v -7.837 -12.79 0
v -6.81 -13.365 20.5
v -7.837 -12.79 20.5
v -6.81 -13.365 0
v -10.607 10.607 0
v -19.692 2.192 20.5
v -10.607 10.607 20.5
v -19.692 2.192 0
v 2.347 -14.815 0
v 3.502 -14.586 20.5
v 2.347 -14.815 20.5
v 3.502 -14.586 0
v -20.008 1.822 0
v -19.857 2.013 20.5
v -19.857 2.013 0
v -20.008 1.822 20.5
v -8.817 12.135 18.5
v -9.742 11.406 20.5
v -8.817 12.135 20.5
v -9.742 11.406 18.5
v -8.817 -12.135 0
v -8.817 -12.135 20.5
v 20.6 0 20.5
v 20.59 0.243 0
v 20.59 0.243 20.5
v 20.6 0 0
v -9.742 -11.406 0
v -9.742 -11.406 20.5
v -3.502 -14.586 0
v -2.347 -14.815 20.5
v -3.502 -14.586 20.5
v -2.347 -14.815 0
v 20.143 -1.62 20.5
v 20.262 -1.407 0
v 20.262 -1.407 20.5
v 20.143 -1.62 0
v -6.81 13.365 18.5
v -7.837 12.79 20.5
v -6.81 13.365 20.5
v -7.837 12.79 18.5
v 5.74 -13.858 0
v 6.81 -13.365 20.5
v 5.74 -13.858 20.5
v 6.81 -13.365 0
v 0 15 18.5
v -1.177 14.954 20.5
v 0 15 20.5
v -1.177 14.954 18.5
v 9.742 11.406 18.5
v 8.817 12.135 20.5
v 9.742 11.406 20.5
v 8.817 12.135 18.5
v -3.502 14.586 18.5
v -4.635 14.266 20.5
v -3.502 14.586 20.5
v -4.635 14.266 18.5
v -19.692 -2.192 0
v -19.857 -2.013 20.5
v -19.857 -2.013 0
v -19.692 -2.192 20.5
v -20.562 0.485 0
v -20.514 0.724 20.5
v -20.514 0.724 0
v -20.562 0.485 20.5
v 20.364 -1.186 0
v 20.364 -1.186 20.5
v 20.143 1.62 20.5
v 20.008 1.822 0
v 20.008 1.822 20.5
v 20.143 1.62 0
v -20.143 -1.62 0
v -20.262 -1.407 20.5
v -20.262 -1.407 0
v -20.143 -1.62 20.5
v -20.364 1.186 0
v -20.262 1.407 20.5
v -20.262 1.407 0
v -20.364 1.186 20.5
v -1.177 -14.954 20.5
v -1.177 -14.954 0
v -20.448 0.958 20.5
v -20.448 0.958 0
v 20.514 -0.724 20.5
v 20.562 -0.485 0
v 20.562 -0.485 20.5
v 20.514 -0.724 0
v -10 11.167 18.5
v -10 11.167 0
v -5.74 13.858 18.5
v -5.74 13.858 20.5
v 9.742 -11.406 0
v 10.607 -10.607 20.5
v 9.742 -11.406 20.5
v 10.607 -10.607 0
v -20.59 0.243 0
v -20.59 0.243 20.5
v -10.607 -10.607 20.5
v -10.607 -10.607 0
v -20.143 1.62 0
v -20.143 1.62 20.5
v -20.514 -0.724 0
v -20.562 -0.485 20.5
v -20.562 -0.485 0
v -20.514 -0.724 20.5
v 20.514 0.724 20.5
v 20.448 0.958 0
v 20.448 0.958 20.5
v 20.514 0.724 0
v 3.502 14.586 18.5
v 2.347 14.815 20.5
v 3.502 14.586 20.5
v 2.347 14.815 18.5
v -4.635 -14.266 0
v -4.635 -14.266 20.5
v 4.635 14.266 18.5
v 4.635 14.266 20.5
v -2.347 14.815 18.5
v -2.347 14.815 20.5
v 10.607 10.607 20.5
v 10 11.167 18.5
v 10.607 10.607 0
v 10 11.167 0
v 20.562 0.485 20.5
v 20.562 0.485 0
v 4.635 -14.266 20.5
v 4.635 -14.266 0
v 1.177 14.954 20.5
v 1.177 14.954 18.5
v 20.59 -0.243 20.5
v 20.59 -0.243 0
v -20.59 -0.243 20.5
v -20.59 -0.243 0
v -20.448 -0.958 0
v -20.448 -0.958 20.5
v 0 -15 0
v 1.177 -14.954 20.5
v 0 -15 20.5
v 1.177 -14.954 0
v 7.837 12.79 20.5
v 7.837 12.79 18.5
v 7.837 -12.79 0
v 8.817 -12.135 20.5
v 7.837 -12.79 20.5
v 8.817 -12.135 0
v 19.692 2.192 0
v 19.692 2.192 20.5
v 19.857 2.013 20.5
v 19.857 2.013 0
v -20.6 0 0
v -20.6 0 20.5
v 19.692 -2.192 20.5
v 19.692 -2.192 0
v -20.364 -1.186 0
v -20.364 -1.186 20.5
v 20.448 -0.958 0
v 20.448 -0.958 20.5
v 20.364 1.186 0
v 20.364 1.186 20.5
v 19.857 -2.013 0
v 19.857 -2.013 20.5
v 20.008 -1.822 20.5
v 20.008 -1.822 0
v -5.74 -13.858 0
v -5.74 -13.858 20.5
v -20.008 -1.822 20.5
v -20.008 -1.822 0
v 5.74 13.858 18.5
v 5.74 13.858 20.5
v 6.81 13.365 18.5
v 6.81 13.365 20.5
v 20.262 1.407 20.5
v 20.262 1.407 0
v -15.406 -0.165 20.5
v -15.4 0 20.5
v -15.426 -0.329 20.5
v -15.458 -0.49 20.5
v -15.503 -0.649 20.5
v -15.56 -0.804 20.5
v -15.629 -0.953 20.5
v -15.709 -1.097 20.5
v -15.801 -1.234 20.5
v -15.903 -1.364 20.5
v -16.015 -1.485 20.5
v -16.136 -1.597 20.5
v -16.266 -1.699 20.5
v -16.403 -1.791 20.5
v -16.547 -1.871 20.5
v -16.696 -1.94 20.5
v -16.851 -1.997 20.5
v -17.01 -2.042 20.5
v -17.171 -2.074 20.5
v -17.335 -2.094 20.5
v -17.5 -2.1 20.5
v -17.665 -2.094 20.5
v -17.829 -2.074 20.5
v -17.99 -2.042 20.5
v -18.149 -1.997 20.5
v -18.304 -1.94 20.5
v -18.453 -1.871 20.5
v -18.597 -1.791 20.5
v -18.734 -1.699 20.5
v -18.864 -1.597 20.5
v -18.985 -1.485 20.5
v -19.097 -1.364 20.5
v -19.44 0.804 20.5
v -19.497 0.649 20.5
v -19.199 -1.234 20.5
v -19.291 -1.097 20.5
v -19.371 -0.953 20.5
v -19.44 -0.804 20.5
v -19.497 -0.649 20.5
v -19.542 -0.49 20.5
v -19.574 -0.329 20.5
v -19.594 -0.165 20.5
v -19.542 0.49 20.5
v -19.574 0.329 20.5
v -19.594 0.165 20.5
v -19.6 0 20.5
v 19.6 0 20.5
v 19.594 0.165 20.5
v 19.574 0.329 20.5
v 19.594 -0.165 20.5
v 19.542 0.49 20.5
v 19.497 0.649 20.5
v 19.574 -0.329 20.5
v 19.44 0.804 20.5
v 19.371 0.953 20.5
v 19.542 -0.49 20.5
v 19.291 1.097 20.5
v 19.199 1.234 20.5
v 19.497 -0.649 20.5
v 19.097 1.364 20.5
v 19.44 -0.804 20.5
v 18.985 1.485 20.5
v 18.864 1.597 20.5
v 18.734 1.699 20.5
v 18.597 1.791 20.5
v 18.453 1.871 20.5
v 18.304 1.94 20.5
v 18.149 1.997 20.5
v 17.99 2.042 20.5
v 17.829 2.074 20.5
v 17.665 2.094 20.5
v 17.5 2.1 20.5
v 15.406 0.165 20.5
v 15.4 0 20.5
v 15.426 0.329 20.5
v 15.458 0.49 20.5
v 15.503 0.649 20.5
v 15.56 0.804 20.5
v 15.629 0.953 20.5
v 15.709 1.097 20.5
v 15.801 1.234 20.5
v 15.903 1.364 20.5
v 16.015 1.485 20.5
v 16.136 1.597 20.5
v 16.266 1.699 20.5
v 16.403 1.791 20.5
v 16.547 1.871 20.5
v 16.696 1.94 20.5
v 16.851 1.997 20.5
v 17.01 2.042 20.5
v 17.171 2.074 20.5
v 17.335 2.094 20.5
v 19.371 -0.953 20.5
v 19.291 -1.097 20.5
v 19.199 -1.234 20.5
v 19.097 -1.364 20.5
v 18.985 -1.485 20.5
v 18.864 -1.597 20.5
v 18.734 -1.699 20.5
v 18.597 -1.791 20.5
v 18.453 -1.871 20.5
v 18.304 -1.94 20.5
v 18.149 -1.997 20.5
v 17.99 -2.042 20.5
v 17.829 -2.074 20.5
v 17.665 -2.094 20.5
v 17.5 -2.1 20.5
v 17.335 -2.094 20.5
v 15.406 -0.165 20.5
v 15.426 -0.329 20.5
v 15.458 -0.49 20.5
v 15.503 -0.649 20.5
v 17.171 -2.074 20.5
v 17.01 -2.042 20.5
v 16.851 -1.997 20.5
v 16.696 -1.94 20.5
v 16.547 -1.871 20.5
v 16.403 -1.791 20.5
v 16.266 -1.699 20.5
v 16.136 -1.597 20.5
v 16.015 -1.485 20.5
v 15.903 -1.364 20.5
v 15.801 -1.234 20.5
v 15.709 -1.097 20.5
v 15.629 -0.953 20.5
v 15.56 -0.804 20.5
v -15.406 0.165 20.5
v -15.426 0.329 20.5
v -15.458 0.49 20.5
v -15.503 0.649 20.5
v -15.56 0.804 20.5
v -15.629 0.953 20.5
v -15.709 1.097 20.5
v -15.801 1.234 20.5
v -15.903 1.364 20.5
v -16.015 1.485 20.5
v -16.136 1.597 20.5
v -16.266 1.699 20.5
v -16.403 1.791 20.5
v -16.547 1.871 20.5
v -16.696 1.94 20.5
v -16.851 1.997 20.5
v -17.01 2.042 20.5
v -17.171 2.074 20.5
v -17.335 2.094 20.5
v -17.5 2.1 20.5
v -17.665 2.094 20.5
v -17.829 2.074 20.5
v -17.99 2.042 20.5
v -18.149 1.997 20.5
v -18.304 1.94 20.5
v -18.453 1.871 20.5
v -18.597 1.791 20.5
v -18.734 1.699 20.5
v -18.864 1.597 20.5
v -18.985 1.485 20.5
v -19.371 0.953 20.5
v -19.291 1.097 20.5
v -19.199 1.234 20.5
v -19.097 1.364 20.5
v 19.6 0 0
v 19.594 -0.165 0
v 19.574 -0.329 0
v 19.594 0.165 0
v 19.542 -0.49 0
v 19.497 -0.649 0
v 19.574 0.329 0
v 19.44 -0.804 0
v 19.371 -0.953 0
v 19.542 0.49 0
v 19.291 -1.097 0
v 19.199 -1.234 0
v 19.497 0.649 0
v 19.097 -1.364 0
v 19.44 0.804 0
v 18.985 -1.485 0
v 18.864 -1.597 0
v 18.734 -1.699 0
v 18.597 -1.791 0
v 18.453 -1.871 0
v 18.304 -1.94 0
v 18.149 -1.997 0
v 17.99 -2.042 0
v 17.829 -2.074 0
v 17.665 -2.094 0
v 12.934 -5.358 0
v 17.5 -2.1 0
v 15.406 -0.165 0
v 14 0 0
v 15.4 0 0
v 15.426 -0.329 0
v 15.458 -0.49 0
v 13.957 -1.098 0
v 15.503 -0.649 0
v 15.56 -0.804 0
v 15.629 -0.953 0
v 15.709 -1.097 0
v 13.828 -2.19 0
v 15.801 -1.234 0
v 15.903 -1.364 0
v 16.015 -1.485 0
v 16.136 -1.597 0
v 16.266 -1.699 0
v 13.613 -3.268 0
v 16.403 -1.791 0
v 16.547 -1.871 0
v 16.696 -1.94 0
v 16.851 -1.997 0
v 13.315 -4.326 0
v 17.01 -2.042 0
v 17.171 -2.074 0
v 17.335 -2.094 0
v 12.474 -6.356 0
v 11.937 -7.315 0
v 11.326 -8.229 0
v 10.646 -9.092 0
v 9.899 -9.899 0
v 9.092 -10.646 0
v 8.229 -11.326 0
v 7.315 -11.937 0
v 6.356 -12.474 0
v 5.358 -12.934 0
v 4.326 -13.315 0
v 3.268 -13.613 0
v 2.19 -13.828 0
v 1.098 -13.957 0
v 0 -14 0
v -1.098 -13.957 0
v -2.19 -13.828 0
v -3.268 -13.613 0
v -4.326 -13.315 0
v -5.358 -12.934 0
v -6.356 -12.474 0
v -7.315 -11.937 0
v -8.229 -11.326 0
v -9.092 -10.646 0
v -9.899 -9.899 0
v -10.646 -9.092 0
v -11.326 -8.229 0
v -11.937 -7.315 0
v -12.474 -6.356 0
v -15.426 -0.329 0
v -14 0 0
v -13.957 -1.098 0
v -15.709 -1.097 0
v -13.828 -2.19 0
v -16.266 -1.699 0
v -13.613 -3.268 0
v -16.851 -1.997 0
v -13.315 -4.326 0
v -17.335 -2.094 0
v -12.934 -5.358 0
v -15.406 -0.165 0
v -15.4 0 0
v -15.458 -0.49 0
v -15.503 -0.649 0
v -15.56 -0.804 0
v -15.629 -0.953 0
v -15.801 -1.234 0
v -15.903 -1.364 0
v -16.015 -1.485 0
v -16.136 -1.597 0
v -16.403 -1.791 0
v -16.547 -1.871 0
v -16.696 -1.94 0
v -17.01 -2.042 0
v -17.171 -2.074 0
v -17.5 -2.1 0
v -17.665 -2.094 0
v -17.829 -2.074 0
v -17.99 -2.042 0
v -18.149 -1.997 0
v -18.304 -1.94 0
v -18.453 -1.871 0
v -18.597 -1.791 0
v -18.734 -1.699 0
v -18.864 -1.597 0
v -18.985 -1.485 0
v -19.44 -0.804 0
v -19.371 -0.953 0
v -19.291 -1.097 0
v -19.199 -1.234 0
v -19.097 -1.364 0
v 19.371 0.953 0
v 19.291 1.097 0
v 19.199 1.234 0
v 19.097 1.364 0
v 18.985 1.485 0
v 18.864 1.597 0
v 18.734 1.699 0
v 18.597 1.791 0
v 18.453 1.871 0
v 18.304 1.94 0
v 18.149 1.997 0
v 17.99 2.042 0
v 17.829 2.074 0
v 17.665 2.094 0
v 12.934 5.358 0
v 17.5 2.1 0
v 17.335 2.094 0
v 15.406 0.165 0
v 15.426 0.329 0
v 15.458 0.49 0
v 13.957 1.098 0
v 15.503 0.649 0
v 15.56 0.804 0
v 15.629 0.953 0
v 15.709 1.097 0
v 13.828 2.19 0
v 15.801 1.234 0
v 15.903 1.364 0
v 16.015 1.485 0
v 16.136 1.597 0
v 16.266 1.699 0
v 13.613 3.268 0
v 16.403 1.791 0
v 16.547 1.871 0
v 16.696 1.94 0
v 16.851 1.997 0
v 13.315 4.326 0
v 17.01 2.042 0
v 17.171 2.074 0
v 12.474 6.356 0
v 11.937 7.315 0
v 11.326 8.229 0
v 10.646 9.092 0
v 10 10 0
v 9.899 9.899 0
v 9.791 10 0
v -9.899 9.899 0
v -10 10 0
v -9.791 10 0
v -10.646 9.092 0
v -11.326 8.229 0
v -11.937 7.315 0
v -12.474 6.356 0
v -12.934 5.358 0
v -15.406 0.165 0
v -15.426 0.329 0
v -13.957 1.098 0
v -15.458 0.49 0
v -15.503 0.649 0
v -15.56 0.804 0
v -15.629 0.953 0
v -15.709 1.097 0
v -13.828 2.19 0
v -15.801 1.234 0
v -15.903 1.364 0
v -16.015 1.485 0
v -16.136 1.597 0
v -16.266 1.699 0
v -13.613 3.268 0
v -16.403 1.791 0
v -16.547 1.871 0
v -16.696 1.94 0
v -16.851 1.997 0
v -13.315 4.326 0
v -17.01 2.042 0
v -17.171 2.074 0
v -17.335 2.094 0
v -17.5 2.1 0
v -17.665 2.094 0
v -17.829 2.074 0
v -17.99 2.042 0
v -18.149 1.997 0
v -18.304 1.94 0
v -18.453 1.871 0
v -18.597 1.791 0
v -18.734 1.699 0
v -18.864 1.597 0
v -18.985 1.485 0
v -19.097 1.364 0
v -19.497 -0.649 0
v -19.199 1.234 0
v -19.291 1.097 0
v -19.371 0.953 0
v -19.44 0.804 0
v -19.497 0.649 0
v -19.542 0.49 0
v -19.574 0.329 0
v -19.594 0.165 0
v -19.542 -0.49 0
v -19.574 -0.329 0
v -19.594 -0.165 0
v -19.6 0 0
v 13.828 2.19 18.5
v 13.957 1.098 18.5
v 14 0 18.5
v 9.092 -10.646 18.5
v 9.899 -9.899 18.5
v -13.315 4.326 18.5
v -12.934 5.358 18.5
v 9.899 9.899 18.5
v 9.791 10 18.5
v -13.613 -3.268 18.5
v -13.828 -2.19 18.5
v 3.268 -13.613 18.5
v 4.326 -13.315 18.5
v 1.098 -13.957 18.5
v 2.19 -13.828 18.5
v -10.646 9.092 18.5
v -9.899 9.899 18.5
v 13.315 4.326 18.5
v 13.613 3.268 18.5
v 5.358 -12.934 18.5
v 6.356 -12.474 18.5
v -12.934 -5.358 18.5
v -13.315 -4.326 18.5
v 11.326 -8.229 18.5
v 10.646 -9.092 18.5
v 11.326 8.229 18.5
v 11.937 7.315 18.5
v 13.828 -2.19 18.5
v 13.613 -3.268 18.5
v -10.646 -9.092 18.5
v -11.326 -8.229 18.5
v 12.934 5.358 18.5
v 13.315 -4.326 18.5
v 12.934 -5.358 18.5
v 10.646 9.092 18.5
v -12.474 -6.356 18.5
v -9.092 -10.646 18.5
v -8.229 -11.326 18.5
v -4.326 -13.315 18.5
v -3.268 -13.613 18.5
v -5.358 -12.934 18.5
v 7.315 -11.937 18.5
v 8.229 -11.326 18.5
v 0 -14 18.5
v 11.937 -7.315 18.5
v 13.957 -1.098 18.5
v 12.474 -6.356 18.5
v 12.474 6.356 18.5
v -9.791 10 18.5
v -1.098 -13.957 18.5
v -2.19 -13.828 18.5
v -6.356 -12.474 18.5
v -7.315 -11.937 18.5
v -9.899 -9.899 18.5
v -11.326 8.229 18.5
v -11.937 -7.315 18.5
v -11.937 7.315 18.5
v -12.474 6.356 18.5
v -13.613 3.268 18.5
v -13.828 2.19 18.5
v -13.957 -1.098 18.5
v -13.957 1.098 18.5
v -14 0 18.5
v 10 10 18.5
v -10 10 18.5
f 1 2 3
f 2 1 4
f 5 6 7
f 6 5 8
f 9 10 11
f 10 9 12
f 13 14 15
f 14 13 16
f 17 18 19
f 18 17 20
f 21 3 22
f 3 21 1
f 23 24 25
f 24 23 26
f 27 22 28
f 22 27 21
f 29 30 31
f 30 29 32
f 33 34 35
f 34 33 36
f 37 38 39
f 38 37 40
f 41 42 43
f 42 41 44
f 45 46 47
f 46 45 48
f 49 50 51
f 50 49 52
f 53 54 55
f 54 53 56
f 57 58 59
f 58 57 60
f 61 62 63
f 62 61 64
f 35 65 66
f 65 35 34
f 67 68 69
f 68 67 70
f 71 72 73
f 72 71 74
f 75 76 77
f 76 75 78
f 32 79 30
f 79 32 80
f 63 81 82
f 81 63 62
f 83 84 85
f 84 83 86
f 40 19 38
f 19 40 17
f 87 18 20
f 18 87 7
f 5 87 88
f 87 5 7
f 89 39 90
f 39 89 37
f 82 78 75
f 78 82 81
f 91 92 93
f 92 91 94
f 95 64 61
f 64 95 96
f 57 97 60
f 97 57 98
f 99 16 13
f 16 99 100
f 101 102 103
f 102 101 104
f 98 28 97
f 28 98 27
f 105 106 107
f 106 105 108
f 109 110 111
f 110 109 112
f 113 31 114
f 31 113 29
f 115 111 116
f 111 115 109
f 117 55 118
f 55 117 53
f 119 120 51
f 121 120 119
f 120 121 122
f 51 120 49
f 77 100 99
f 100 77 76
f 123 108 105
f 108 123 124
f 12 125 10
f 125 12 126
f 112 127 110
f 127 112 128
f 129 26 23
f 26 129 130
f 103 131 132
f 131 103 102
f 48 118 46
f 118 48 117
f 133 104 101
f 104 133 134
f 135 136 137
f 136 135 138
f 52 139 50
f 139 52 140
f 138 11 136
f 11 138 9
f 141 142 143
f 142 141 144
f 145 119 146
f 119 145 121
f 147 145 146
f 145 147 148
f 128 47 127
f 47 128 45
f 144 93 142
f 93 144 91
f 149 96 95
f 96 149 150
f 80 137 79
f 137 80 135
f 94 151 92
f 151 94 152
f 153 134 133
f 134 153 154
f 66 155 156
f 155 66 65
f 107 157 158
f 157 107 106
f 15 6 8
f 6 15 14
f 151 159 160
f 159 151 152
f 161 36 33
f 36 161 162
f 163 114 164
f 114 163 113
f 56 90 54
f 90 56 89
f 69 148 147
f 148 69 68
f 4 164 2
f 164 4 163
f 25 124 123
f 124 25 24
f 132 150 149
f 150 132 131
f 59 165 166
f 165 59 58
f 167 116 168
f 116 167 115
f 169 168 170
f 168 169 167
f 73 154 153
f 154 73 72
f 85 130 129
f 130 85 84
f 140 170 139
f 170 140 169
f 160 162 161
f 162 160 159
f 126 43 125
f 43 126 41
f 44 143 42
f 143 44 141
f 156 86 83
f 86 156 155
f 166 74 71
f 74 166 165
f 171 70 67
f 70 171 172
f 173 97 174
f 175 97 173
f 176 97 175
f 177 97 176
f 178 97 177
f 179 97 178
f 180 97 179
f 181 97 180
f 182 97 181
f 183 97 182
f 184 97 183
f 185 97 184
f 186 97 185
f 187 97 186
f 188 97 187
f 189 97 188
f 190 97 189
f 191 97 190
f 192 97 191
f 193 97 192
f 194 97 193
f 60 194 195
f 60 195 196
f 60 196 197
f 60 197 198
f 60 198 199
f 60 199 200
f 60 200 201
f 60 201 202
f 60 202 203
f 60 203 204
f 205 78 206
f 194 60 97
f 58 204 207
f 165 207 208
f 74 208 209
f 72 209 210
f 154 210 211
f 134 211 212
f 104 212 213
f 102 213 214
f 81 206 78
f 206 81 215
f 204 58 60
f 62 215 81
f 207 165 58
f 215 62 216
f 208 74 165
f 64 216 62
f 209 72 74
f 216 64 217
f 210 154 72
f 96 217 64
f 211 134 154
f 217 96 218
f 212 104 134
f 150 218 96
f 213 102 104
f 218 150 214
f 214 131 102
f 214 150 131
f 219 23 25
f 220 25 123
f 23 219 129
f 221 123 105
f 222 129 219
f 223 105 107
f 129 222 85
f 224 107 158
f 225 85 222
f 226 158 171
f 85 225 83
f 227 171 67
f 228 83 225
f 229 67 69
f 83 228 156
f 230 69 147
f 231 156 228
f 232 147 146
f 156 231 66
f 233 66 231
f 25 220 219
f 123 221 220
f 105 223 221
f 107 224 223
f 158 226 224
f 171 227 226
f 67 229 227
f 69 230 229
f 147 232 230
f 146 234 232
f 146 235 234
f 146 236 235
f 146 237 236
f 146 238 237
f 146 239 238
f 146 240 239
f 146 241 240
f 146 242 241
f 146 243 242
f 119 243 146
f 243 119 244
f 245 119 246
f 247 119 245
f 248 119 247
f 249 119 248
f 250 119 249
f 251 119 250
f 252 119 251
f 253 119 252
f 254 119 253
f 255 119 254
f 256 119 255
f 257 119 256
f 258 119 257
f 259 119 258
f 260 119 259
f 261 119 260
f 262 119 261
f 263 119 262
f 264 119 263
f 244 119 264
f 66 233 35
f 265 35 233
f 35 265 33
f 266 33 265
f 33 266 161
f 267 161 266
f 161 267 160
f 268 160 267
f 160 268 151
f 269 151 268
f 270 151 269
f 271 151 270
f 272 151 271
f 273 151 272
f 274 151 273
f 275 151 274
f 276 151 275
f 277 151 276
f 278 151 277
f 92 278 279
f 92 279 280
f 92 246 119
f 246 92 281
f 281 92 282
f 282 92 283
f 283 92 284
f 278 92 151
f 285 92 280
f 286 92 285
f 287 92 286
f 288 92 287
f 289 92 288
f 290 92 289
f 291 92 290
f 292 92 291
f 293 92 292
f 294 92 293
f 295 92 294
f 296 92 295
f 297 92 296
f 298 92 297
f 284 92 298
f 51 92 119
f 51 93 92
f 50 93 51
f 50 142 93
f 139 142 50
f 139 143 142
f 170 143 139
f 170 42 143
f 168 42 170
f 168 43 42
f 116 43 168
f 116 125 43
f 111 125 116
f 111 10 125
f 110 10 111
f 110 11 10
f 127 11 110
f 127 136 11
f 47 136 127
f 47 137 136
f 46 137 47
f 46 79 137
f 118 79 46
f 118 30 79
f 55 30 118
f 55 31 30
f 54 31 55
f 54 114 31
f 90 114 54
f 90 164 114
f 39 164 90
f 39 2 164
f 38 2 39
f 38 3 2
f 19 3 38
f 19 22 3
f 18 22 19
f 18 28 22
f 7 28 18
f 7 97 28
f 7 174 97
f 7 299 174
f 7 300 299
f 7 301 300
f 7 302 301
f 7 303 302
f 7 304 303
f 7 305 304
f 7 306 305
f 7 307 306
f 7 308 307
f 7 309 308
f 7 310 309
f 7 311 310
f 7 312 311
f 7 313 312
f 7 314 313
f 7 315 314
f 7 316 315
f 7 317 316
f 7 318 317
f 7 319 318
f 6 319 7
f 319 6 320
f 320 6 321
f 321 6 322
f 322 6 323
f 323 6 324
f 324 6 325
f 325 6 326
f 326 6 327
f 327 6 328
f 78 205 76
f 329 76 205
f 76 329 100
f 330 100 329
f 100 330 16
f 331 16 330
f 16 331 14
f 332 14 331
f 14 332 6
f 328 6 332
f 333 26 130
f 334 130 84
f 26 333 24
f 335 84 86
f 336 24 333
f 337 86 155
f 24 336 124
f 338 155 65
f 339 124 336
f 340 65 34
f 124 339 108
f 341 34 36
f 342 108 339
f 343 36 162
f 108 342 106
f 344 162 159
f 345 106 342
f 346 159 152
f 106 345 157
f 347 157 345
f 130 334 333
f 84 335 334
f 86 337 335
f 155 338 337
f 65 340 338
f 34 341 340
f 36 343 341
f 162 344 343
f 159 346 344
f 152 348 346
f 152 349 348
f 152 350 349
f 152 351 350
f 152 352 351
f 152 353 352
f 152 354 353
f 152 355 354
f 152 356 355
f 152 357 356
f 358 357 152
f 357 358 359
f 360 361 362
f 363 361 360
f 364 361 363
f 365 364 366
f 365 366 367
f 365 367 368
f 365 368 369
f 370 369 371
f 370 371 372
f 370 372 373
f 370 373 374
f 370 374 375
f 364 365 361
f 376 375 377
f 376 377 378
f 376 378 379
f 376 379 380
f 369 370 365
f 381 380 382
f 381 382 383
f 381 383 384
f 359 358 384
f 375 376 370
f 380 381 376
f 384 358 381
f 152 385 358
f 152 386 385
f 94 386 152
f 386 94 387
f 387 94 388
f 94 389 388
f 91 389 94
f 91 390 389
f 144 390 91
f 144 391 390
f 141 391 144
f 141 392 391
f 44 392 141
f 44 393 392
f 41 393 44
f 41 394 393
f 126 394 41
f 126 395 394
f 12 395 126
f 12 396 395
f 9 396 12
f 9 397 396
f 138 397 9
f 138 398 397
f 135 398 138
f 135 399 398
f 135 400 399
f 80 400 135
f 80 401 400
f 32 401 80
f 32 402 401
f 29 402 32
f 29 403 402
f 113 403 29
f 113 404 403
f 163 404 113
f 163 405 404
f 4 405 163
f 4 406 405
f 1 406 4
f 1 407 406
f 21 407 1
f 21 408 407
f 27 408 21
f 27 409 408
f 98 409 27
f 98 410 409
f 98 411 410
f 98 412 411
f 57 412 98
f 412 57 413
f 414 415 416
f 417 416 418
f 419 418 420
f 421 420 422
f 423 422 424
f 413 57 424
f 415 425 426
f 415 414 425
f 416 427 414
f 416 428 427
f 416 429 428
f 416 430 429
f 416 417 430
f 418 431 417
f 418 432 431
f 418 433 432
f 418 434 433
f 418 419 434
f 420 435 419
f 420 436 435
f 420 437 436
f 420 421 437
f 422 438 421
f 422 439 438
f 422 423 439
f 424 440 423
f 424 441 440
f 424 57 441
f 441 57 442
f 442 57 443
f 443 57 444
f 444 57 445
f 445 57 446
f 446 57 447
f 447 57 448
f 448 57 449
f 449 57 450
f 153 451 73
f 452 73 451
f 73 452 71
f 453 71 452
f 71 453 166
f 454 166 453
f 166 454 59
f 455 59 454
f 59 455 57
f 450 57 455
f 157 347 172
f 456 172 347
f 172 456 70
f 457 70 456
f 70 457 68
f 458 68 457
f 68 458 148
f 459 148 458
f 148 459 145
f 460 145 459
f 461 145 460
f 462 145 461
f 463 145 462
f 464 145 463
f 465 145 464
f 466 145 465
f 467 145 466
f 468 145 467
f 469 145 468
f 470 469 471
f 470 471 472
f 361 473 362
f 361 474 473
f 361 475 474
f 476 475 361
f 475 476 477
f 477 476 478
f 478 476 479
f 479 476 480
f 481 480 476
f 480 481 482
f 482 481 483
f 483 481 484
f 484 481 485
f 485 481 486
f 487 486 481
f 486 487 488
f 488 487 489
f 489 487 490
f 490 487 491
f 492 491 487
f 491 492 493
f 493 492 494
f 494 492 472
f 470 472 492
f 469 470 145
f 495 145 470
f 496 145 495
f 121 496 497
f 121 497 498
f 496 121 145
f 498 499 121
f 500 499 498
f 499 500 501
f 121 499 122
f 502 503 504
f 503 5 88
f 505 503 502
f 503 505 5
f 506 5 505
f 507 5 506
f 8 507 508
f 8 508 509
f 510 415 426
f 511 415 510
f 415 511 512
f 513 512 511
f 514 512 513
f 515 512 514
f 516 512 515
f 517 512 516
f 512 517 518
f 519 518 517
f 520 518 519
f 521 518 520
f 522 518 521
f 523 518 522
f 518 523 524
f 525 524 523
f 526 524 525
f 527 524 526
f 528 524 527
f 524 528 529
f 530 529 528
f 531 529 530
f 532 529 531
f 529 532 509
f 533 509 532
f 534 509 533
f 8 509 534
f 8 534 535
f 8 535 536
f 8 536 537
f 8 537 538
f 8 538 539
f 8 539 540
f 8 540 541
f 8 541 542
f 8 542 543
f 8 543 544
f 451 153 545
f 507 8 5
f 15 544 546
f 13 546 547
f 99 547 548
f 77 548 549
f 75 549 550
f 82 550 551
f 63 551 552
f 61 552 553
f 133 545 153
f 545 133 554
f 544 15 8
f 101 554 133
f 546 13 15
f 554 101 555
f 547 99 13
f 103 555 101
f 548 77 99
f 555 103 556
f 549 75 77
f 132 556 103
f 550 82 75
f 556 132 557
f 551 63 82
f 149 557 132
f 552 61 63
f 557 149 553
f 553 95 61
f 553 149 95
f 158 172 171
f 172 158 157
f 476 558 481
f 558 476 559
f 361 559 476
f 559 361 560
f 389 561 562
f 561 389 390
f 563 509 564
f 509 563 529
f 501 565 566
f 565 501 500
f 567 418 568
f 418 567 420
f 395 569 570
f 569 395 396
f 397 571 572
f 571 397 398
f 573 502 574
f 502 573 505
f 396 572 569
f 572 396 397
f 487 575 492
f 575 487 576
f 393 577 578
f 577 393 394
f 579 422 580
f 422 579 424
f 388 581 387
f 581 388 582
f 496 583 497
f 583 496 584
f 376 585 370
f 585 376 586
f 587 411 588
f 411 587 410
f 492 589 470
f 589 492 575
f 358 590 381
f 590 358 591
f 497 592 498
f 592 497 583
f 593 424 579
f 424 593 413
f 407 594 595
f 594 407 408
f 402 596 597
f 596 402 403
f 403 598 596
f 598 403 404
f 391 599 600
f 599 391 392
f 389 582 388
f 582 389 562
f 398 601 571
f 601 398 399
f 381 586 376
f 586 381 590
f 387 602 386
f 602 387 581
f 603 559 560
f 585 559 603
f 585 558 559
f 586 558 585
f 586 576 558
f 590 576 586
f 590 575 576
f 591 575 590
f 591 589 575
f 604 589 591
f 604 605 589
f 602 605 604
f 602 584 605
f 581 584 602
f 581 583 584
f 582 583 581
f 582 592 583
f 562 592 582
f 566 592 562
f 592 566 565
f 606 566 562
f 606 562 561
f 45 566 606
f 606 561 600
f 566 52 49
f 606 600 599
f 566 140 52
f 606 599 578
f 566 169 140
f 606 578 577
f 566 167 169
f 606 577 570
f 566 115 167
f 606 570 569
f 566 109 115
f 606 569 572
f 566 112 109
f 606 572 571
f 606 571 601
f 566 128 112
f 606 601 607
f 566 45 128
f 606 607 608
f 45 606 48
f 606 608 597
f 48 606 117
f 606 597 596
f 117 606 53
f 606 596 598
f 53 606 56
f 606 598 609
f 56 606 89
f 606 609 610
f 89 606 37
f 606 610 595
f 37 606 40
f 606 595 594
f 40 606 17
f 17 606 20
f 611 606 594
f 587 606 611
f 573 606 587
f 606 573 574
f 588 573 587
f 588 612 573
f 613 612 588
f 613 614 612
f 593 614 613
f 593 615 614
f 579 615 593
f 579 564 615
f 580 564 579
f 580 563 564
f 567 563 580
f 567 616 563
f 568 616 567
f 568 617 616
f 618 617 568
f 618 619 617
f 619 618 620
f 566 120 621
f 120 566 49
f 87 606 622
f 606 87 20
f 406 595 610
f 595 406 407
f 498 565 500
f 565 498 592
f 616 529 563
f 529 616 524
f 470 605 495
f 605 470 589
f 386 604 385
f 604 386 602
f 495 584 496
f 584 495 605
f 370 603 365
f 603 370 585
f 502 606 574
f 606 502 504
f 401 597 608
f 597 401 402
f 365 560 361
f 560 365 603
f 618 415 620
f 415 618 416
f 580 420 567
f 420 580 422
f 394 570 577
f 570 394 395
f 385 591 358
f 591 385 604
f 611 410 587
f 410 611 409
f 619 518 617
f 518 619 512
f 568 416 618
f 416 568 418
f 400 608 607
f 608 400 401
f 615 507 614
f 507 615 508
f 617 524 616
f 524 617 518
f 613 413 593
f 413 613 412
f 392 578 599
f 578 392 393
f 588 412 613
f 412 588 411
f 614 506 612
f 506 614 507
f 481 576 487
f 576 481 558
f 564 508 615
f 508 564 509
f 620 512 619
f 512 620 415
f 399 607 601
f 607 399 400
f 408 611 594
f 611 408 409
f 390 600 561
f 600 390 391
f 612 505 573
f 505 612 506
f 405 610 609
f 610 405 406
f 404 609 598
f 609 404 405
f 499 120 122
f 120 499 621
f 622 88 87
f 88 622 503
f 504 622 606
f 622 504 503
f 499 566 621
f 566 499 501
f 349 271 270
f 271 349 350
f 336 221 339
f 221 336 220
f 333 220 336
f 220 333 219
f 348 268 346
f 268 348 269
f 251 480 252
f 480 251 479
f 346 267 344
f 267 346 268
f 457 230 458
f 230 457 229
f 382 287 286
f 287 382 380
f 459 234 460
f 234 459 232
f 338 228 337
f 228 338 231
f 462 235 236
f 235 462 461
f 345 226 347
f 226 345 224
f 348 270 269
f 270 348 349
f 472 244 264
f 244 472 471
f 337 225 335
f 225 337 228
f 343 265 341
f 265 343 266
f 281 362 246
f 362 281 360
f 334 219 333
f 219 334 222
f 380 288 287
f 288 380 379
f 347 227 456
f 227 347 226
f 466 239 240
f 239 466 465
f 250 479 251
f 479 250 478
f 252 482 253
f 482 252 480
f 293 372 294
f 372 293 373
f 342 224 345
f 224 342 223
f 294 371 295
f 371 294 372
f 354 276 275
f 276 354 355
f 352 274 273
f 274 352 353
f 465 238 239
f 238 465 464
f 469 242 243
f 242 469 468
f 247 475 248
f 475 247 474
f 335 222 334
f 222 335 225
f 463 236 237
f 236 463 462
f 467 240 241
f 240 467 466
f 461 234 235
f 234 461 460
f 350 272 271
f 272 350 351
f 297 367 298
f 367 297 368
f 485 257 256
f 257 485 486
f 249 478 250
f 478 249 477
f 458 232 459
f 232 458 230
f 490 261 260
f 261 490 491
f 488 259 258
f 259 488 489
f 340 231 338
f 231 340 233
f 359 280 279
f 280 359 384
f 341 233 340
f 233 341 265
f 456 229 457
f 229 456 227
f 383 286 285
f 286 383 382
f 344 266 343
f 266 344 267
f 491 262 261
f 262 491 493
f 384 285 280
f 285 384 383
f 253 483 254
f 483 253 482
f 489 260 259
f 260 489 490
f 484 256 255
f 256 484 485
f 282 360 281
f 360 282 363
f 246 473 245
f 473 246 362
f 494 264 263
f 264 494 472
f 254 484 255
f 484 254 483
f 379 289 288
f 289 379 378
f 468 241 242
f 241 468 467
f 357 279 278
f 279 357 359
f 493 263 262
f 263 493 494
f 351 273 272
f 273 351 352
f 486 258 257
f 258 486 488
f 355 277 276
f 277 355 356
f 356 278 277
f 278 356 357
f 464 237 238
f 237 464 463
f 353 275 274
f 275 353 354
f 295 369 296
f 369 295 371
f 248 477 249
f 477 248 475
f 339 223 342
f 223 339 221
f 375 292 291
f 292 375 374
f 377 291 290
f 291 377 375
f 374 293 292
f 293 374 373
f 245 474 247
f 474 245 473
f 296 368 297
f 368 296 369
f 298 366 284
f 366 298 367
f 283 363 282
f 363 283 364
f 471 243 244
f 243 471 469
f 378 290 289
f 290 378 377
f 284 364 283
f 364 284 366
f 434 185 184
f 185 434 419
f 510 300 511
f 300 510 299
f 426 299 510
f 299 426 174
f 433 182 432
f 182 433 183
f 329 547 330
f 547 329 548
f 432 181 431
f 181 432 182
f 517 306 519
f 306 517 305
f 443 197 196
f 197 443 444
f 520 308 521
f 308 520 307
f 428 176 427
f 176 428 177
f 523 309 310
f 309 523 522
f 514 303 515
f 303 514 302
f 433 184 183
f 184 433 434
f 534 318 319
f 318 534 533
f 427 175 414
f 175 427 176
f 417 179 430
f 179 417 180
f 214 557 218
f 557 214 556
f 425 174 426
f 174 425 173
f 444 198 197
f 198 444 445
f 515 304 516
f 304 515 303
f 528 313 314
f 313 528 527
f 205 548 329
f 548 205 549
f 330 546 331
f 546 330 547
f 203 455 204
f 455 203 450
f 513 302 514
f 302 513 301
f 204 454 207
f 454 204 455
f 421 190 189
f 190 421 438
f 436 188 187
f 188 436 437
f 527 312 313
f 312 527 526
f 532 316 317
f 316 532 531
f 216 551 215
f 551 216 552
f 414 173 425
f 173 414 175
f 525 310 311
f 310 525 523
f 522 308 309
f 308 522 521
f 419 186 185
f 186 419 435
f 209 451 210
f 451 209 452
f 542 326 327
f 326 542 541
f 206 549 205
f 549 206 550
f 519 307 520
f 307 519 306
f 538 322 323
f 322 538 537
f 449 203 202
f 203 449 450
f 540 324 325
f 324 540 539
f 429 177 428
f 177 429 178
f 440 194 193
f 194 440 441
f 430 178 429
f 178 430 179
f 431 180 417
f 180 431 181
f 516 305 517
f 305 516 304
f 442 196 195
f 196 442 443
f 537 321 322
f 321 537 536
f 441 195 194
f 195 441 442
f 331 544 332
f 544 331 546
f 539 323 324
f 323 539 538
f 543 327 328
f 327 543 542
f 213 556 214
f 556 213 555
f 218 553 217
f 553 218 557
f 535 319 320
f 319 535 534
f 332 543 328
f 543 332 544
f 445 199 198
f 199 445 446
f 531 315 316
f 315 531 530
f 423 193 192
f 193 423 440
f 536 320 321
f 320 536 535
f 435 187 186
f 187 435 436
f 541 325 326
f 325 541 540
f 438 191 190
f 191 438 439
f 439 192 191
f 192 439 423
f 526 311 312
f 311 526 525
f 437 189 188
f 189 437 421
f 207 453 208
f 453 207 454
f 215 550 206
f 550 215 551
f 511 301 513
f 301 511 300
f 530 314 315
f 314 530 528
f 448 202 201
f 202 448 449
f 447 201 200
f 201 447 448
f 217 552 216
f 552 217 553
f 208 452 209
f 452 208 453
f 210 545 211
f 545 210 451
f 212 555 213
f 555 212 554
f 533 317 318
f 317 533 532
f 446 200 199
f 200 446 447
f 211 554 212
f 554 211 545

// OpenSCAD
//holder for step motor28BYJ-48
$fn = 80;

wallThickness = 2;

motorDiameter = 28;
motorDepth = 18.5;
motorOpening = 17.5;

boltDistance = 35;
boltDiameter = 4.2;

difference(){
    union(){
        hull(){
            cylinder(d = motorDiameter+wallThickness, h = motorDepth+wallThickness);

            translate([boltDistance/2., 0, 0]){
                cylinder(d = boltDiameter+wallThickness, h = motorDepth+wallThickness);
        }

            translate([-boltDistance/2., 0, 0]){
                cylinder(d = boltDiameter+wallThickness, h = motorDepth+wallThickness);
        }
    }
    }

    cylinder(d = motorDiameter, h = motorDepth);

    translate([-10, 10, 0]){
        cube([20, 17.5, motorDepth]);
    }
    translate([boltDistance/2., 0, 0]){
    cylinder(d = boltDiameter, h = motorDepth+wallThickness);
    }
    
    translate([-boltDistance/2., 0, 0]){
        cylinder(d = boltDiameter, h = motorDepth+wallThickness);
    }
}
